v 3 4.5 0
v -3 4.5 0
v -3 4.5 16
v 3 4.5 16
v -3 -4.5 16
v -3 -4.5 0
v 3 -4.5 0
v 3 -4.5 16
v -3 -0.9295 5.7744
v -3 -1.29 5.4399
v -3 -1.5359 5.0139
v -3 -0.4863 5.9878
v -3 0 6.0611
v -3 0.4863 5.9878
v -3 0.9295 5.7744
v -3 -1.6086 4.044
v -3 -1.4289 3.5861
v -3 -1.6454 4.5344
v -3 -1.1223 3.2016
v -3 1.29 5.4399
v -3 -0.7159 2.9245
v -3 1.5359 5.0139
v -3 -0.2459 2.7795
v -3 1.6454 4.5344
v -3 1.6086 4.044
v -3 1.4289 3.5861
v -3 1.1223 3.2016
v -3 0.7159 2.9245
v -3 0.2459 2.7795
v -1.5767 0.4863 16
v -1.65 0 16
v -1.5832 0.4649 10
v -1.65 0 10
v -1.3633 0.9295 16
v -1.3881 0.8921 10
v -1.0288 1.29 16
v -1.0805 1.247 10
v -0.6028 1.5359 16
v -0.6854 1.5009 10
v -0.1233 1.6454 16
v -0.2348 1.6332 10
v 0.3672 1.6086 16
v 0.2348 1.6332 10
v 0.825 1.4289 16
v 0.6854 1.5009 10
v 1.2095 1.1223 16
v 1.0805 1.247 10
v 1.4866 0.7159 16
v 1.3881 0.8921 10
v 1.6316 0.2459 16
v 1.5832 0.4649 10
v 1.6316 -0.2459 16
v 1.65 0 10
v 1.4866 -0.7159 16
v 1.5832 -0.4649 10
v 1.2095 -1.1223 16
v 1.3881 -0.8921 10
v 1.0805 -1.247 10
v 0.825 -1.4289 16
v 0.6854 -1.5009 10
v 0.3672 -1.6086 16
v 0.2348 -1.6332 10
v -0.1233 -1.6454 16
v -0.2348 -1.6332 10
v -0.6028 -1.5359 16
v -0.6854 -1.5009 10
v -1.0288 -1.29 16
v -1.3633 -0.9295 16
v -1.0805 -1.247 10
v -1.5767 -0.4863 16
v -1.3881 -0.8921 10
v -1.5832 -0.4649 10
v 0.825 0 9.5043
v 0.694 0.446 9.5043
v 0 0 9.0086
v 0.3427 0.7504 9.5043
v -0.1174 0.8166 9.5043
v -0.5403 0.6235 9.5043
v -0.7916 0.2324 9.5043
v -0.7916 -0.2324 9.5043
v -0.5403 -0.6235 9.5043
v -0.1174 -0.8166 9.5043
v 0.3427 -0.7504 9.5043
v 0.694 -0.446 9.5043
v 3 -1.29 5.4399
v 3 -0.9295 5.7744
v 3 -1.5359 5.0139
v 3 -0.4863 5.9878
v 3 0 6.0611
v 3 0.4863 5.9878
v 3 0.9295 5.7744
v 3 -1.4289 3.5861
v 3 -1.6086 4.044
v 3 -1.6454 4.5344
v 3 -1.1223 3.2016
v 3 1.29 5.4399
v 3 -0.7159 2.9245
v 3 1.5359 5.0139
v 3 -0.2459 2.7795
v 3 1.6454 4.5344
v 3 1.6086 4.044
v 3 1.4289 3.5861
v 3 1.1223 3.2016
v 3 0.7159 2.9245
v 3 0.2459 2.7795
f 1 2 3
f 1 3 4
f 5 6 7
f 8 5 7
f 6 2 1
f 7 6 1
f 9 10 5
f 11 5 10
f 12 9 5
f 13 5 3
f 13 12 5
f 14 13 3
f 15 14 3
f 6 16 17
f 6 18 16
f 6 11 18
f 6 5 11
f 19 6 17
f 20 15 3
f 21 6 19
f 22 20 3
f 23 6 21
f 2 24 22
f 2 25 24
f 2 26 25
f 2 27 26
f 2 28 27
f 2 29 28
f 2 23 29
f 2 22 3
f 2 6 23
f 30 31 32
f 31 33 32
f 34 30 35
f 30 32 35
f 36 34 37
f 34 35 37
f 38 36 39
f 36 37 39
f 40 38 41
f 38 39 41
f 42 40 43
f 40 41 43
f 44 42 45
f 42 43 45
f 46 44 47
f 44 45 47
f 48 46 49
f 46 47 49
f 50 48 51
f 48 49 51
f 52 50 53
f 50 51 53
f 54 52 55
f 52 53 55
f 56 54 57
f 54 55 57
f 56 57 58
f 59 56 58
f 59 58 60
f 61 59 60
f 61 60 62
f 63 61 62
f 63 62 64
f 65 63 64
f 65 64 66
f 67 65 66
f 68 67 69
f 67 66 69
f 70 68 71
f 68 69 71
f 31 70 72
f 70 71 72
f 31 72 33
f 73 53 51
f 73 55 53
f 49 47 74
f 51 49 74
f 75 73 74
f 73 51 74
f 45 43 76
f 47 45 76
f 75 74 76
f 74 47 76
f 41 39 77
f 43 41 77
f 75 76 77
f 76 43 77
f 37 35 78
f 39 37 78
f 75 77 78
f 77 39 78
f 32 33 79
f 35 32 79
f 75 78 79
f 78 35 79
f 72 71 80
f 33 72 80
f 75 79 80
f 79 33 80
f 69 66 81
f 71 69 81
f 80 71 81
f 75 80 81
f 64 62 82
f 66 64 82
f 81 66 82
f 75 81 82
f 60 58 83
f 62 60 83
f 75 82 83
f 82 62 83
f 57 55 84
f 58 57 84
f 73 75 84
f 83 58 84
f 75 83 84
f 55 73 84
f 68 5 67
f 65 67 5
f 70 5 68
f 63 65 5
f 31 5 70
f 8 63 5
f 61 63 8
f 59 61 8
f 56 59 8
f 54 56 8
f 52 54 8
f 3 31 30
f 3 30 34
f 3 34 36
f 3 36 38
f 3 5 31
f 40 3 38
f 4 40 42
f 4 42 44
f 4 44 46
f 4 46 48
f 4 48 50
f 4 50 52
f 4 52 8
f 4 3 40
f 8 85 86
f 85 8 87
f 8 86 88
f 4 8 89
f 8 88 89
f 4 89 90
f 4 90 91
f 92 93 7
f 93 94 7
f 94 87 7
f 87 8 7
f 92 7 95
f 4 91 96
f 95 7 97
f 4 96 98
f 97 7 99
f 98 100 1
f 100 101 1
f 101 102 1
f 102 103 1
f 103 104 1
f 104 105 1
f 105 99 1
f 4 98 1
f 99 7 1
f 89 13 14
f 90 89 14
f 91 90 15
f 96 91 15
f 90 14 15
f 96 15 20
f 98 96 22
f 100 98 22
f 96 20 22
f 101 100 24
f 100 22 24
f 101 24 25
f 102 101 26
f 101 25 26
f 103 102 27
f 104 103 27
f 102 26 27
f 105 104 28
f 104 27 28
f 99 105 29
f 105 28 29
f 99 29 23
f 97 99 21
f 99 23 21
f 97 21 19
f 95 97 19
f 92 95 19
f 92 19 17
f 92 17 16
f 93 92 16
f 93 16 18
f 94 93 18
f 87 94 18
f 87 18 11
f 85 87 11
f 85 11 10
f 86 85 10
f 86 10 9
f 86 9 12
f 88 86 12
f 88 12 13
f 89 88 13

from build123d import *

# Parameters (mm, degrees)
SKETCH1_W             = 6
SKETCH1_H             = 9
BOSS_EXTRUDE1_DEPTH   = 16
M4_TAPPED_HOLE1_D     = 3.3
M4_TAPPED_HOLE1_DEPTH = 6
M4_TAPPED_HOLE1_TIP   = 0.991420021
M4_TAPPED_HOLE2_D     = 3.3


with BuildPart() as part:
    # Sketch1 → Boss-Extrude1 (new body)
    with BuildSketch(Plane.XY):
        Rectangle(SKETCH1_W, SKETCH1_H)
    extrude(amount=BOSS_EXTRUDE1_DEPTH)

    # M4 Tapped Hole1
    with Locations(Plane.XY.offset(16)):
        with Locations((0, 0)):
            Hole(M4_TAPPED_HOLE1_D / 2, depth=M4_TAPPED_HOLE1_DEPTH)
            with Locations((0, 0, -(M4_TAPPED_HOLE1_DEPTH + M4_TAPPED_HOLE1_TIP / 2))):  # 118° drill point
                Cone(0, M4_TAPPED_HOLE1_D / 2, M4_TAPPED_HOLE1_TIP, mode=Mode.SUBTRACT)

    # M4 Tapped Hole2 (through all)
    with Locations(Plane(origin=(3, 0, 0), x_dir=(0, 0, -1), z_dir=(1, 0, 0))):
        with Locations((-4.411118023, 0)):
            Hole(M4_TAPPED_HOLE2_D / 2)


solid = part.part
